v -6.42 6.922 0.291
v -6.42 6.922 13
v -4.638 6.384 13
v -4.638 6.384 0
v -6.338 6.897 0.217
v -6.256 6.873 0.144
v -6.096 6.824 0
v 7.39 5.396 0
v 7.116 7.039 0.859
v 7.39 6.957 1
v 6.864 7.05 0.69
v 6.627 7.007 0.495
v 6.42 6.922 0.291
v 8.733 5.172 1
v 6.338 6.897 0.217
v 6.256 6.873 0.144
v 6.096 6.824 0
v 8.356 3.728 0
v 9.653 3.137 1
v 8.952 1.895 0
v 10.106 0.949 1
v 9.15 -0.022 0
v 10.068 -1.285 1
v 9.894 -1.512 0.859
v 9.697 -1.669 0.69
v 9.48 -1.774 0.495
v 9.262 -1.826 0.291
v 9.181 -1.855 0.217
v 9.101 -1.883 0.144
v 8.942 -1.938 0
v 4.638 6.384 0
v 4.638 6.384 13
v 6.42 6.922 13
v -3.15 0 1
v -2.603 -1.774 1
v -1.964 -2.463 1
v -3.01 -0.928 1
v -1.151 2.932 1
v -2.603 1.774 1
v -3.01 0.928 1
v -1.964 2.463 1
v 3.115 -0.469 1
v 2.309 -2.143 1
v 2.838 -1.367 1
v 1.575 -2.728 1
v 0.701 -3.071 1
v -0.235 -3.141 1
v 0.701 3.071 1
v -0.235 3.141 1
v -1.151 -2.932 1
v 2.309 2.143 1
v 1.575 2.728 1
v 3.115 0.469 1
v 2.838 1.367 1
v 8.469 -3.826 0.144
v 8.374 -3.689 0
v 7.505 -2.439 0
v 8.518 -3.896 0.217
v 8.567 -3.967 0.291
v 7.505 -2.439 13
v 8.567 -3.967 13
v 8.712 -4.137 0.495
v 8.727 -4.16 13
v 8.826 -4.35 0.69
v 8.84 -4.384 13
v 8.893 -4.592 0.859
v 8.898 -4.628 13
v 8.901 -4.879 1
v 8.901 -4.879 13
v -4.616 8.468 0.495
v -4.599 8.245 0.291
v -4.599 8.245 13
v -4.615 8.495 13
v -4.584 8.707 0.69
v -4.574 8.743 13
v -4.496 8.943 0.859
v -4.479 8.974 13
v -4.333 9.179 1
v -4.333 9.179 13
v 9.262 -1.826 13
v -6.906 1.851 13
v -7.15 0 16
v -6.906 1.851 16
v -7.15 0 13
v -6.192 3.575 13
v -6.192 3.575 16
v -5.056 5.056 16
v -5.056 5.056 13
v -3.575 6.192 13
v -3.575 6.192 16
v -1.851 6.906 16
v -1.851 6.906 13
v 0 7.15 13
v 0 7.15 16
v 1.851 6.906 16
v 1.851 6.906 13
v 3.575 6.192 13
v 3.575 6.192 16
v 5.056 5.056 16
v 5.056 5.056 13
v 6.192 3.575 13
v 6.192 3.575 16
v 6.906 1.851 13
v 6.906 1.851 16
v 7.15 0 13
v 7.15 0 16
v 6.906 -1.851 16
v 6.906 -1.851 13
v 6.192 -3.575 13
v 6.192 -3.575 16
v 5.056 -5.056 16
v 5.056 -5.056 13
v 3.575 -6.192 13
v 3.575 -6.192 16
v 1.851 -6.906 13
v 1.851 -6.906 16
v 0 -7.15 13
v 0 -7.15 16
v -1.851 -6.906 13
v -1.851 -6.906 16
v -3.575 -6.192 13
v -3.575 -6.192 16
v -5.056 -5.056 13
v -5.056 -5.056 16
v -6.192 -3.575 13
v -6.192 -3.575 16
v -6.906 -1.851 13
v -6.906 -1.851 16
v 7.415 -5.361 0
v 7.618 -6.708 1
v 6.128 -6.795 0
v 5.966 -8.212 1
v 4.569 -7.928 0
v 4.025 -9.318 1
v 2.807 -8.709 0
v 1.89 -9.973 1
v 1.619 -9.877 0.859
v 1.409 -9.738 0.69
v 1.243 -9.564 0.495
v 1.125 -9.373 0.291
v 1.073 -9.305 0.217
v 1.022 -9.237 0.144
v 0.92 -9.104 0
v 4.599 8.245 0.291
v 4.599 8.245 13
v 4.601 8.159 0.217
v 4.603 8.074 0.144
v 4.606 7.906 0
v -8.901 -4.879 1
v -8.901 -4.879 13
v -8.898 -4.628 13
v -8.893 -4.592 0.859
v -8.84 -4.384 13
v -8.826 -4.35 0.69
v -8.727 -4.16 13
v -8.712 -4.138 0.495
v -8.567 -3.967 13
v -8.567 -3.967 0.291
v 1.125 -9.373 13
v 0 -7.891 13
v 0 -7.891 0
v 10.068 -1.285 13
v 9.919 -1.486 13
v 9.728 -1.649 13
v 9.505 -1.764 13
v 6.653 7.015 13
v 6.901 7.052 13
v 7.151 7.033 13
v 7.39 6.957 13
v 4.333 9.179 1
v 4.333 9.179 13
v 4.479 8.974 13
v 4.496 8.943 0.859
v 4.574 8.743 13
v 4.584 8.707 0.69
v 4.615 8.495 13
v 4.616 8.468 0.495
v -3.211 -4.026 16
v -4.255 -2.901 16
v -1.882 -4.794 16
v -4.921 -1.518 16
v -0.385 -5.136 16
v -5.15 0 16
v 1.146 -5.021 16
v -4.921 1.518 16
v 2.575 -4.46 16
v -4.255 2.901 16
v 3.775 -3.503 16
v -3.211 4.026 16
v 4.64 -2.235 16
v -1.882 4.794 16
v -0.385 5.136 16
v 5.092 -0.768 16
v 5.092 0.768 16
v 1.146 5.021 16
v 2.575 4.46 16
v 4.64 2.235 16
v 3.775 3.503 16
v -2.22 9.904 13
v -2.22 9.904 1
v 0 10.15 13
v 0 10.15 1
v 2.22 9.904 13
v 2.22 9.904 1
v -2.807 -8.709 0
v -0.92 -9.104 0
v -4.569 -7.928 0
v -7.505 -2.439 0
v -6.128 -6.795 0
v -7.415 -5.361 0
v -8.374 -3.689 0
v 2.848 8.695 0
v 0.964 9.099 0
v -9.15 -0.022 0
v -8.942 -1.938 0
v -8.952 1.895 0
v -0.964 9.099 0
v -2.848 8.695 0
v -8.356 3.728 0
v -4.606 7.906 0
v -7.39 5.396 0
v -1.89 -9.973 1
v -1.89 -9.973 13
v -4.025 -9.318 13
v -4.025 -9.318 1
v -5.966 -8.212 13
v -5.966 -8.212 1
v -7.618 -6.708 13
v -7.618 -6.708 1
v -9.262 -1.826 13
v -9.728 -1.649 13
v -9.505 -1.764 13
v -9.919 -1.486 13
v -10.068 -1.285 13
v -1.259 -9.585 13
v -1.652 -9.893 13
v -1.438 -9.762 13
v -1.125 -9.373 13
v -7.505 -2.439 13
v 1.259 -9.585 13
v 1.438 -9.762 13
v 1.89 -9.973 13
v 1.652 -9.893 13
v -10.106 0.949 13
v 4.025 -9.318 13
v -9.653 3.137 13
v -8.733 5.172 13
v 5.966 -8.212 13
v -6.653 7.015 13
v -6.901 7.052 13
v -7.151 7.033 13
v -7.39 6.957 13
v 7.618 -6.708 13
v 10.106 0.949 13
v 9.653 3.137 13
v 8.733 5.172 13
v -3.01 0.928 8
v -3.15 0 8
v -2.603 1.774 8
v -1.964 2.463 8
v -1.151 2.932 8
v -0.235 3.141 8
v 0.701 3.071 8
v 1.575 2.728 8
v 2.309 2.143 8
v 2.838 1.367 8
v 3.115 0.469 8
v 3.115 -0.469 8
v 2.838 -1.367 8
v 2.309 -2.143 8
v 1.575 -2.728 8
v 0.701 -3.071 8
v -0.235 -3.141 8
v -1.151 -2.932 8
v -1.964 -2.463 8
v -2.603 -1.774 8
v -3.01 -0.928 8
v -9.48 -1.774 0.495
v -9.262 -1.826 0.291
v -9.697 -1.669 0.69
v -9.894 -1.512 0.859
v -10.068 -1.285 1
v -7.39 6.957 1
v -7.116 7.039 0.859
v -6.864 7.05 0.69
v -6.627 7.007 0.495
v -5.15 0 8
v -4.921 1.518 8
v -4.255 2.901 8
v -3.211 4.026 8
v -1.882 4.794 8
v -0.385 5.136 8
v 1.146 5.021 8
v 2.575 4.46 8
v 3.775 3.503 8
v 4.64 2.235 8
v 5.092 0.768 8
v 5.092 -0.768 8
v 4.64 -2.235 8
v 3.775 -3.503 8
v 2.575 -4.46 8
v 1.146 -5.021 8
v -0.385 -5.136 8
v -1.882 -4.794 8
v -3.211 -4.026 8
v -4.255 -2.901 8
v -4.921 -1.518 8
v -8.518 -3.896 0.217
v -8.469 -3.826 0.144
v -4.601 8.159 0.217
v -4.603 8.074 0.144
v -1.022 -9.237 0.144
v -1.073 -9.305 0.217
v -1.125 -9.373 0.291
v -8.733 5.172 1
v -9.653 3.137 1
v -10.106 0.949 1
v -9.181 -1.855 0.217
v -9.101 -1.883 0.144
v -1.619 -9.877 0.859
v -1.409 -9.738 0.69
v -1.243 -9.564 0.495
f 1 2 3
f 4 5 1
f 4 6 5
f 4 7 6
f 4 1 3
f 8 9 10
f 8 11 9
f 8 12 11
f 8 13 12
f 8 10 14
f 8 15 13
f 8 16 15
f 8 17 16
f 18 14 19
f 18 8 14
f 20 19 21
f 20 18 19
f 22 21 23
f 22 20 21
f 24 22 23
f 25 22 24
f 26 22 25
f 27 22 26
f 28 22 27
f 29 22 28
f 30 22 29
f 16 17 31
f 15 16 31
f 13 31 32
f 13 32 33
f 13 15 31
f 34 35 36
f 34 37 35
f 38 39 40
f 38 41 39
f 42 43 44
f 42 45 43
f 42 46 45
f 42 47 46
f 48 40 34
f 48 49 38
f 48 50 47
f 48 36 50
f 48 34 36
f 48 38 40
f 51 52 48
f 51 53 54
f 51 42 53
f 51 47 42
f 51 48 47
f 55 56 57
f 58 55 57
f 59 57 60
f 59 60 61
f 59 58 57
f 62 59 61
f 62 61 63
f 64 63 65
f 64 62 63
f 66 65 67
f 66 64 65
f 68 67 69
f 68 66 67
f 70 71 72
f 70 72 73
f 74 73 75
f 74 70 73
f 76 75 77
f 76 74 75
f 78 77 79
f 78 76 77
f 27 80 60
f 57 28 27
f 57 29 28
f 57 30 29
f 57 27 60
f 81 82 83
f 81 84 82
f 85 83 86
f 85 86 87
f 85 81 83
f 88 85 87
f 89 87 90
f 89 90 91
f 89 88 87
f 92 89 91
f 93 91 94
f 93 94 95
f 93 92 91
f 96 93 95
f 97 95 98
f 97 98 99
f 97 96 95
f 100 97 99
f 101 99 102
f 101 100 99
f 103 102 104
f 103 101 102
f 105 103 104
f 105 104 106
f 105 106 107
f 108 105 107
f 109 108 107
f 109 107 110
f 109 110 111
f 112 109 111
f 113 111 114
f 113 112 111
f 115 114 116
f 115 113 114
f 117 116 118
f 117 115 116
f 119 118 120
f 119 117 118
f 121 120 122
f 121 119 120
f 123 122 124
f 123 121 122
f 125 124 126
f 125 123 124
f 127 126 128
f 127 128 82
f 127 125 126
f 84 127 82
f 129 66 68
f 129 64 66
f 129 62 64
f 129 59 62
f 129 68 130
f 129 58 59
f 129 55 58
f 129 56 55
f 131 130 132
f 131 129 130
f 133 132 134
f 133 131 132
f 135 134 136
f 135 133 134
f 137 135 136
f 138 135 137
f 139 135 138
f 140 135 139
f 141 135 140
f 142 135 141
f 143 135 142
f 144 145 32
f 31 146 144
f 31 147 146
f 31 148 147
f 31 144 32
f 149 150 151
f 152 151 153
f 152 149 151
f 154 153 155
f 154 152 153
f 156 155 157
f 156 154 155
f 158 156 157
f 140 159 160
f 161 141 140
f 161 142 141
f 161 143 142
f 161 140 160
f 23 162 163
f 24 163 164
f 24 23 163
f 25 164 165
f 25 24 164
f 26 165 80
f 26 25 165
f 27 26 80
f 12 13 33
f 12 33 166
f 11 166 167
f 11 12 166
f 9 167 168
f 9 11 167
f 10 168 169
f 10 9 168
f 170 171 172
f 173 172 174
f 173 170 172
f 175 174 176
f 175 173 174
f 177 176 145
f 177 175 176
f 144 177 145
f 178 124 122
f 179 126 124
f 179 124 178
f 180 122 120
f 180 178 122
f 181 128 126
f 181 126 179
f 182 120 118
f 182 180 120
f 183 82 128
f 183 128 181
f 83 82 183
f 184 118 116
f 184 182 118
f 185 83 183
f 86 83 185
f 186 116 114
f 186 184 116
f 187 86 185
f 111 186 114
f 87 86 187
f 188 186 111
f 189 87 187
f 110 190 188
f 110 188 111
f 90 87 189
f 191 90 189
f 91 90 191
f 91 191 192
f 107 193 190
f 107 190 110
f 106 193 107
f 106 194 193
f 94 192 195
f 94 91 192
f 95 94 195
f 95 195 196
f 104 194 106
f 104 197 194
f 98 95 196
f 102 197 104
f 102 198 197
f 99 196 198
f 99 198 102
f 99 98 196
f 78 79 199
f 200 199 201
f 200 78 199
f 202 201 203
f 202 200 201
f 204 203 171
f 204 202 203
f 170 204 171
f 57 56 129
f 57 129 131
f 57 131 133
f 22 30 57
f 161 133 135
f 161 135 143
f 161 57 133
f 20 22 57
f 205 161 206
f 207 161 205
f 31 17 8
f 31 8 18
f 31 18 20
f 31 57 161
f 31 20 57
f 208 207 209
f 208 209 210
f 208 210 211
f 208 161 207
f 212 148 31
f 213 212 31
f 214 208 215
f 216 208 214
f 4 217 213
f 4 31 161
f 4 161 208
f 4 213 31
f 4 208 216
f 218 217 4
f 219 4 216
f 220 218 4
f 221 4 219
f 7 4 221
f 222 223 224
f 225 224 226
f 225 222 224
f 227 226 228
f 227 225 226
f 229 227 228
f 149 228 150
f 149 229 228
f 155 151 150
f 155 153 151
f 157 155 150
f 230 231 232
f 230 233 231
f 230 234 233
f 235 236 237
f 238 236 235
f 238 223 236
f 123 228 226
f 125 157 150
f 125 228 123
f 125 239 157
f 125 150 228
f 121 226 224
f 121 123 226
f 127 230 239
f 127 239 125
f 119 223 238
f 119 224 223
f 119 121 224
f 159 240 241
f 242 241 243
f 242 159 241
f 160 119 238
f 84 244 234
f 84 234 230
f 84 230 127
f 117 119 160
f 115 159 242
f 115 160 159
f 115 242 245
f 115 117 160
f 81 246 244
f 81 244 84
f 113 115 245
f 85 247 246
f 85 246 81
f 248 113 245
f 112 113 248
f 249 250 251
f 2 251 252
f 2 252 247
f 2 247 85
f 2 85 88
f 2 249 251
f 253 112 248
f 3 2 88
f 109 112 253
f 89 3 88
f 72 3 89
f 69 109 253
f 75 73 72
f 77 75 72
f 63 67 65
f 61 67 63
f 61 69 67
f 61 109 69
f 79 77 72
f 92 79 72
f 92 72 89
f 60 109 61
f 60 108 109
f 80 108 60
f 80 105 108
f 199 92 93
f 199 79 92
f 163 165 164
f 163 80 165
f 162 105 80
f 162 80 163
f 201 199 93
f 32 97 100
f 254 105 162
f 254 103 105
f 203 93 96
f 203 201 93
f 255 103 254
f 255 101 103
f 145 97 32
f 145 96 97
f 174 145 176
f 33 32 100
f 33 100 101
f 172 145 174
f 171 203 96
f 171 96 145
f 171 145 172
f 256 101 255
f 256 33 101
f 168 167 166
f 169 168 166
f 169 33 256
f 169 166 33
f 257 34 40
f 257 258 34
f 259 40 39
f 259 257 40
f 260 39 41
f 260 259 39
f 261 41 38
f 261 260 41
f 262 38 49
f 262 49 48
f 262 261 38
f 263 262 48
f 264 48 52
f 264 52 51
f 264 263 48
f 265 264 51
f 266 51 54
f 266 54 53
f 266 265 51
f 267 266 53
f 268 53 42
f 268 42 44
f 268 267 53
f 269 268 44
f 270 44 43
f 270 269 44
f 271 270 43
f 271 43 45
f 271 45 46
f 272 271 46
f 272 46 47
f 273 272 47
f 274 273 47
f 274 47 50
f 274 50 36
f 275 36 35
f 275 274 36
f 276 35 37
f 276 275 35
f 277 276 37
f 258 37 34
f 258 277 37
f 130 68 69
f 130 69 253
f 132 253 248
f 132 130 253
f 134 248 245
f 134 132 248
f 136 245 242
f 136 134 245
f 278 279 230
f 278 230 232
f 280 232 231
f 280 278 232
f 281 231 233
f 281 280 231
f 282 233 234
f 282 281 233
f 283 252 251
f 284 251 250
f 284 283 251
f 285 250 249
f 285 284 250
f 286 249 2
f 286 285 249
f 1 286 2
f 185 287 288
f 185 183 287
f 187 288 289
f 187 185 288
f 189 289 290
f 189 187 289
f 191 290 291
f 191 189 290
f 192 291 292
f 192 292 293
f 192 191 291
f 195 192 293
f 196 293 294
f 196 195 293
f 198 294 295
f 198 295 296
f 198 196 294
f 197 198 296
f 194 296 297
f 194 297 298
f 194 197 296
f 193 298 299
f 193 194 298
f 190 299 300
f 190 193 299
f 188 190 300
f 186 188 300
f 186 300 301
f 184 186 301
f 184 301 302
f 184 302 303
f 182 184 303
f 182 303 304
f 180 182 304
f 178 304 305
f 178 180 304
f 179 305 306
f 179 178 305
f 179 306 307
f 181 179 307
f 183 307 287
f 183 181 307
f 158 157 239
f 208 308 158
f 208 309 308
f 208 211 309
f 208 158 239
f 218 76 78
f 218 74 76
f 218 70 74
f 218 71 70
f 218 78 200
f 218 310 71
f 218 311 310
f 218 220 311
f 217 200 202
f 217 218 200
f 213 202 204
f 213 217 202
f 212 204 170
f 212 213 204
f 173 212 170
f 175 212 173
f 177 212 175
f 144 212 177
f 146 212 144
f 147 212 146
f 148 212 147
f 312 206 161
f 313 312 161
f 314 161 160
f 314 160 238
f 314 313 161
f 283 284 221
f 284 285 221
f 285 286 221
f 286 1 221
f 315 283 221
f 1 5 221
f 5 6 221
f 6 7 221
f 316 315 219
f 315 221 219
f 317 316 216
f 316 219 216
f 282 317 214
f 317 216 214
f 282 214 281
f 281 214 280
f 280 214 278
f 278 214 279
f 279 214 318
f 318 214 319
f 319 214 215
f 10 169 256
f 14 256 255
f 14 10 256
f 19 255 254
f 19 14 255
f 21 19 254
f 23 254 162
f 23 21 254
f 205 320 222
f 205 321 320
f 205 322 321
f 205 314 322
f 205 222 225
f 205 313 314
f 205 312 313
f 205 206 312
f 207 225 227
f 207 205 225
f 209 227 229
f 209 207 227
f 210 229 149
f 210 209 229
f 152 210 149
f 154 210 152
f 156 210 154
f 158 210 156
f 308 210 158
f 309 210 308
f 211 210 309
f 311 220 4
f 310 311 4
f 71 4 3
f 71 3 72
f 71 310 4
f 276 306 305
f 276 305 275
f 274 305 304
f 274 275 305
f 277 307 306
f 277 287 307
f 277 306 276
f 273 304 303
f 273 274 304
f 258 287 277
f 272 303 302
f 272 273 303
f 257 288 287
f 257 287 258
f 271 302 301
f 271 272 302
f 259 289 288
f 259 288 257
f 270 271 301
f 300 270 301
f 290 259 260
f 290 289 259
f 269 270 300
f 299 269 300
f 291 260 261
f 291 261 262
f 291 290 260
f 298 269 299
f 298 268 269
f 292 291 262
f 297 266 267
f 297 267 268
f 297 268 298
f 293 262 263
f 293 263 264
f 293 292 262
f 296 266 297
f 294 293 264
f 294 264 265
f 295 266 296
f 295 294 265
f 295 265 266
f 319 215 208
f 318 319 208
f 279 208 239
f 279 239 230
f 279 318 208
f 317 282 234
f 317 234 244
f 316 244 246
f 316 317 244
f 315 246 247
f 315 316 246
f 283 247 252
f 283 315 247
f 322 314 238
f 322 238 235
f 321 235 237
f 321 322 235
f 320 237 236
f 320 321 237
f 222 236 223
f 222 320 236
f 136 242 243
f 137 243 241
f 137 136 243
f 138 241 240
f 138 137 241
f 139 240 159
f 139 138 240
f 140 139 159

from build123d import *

# Parameters (mm, degrees)
F3_DEPTH = 16.001
F4_SIZE  = 1


with BuildPart() as f1:
    # F0 (on Front) → F1 (revolve)
    with BuildSketch(Plane.XZ):
        Polygon((-10.15, 13), (-10.15, 0), (0, 0), (0, 1), (-3.15, 1), (-3.15, 8), (-5.15, 8), (-5.15, 16), (-7.15, 16), (-7.15, 13), align=None)
    revolve(axis=Axis((0, 0, -8.6291319943), (0, 0, -1)))

    # F2 (on Top) → F3 (cut, through all)
    with BuildSketch(Plane.XY):
        with BuildLine():
            Line((0, -7.8913969919), (-1.1252094373, -9.3733511499))
            ThreePointArc((-1.1252094373, -9.3733511499), (-1.4401892892, -9.7634180213), (-1.8953023246, -9.9737429991))
            ThreePointArc((-1.8953023246, -9.9737429991), (0, -11.3207029958), (1.8953023246, -9.9737429991))
            ThreePointArc((1.8953023246, -9.9737429991), (1.4401892892, -9.7634180213), (1.1252094373, -9.3733511499))
            Line((1.1252094373, -9.3733511499), (0, -7.8913969919))
        make_face()
        with BuildLine():
            Line((7.5051645318, -2.4385757799), (8.5668778523, -3.9666625671))
            ThreePointArc((8.5668778523, -3.9666625671), (8.8405193649, -4.3867634999), (8.8999126434, -4.8845957104))
            ThreePointArc((8.8999126434, -4.8845957104), (10.7666283532, -3.498289614), (10.0712738989, -1.2795164581))
            ThreePointArc((10.0712738989, -1.2795164581), (9.7306052959, -1.6473606836), (9.2622955289, -1.826387032))
            Line((9.2622955289, -1.826387032), (7.5051645318, -2.4385757799))
        make_face()
        with BuildLine():
            Line((4.6384467718, 6.3842742758), (6.4198311274, 6.9218188615))
            ThreePointArc((6.4198311274, 6.9218188615), (6.9039307349, 7.0522490777), (7.3957508351, 6.9548968288))
            ThreePointArc((7.3957508351, 6.9548968288), (6.6541422665, 9.1586411119), (4.329087255, 9.1829583388))
            ThreePointArc((4.329087255, 9.1829583388), (4.5736555148, 8.7452931271), (4.5992040135, 8.2445818874))
            Line((4.5992040135, 8.2445818874), (4.6384467718, 6.3842742758))
        make_face()
        with BuildLine():
            Line((-4.6384467718, 6.3842742758), (-4.5992040135, 8.2445818874))
            ThreePointArc((-4.5992040135, 8.2445818874), (-4.5736555148, 8.7452931271), (-4.329087255, 9.1829583388))
            ThreePointArc((-4.329087255, 9.1829583388), (-6.6541422665, 9.1586411119), (-7.3957508351, 6.9548968288))
            ThreePointArc((-7.3957508351, 6.9548968288), (-6.9039307349, 7.0522490777), (-6.4198311274, 6.9218188615))
            Line((-6.4198311274, 6.9218188615), (-4.6384467718, 6.3842742758))
        make_face()
        with BuildLine():
            Line((-7.5051645318, -2.4385757799), (-9.2622955289, -1.826387032))
            ThreePointArc((-9.2622955289, -1.826387032), (-9.7306052959, -1.6473606836), (-10.0712738989, -1.2795164581))
            ThreePointArc((-10.0712738989, -1.2795164581), (-10.7666283532, -3.498289614), (-8.8999126434, -4.8845957104))
            ThreePointArc((-8.8999126434, -4.8845957104), (-8.8405193649, -4.3867634999), (-8.5668778523, -3.9666625671))
            Line((-8.5668778523, -3.9666625671), (-7.5051645318, -2.4385757799))
        make_face()
    extrude(amount=F3_DEPTH, mode=Mode.SUBTRACT)

    # F4
    f4_edges = [f1.edges().sort_by_distance(p)[0] for p in [
        (-5.96602, -8.211522, 0),
        (5.96602, -8.211522, 0),
        (9.653224, 3.136522, 0),
        (0, 10.15, 0),
        (-9.653224, 3.136522, 0),
    ]]
    chamfer(f4_edges, length=F4_SIZE)


solid = f1.part
